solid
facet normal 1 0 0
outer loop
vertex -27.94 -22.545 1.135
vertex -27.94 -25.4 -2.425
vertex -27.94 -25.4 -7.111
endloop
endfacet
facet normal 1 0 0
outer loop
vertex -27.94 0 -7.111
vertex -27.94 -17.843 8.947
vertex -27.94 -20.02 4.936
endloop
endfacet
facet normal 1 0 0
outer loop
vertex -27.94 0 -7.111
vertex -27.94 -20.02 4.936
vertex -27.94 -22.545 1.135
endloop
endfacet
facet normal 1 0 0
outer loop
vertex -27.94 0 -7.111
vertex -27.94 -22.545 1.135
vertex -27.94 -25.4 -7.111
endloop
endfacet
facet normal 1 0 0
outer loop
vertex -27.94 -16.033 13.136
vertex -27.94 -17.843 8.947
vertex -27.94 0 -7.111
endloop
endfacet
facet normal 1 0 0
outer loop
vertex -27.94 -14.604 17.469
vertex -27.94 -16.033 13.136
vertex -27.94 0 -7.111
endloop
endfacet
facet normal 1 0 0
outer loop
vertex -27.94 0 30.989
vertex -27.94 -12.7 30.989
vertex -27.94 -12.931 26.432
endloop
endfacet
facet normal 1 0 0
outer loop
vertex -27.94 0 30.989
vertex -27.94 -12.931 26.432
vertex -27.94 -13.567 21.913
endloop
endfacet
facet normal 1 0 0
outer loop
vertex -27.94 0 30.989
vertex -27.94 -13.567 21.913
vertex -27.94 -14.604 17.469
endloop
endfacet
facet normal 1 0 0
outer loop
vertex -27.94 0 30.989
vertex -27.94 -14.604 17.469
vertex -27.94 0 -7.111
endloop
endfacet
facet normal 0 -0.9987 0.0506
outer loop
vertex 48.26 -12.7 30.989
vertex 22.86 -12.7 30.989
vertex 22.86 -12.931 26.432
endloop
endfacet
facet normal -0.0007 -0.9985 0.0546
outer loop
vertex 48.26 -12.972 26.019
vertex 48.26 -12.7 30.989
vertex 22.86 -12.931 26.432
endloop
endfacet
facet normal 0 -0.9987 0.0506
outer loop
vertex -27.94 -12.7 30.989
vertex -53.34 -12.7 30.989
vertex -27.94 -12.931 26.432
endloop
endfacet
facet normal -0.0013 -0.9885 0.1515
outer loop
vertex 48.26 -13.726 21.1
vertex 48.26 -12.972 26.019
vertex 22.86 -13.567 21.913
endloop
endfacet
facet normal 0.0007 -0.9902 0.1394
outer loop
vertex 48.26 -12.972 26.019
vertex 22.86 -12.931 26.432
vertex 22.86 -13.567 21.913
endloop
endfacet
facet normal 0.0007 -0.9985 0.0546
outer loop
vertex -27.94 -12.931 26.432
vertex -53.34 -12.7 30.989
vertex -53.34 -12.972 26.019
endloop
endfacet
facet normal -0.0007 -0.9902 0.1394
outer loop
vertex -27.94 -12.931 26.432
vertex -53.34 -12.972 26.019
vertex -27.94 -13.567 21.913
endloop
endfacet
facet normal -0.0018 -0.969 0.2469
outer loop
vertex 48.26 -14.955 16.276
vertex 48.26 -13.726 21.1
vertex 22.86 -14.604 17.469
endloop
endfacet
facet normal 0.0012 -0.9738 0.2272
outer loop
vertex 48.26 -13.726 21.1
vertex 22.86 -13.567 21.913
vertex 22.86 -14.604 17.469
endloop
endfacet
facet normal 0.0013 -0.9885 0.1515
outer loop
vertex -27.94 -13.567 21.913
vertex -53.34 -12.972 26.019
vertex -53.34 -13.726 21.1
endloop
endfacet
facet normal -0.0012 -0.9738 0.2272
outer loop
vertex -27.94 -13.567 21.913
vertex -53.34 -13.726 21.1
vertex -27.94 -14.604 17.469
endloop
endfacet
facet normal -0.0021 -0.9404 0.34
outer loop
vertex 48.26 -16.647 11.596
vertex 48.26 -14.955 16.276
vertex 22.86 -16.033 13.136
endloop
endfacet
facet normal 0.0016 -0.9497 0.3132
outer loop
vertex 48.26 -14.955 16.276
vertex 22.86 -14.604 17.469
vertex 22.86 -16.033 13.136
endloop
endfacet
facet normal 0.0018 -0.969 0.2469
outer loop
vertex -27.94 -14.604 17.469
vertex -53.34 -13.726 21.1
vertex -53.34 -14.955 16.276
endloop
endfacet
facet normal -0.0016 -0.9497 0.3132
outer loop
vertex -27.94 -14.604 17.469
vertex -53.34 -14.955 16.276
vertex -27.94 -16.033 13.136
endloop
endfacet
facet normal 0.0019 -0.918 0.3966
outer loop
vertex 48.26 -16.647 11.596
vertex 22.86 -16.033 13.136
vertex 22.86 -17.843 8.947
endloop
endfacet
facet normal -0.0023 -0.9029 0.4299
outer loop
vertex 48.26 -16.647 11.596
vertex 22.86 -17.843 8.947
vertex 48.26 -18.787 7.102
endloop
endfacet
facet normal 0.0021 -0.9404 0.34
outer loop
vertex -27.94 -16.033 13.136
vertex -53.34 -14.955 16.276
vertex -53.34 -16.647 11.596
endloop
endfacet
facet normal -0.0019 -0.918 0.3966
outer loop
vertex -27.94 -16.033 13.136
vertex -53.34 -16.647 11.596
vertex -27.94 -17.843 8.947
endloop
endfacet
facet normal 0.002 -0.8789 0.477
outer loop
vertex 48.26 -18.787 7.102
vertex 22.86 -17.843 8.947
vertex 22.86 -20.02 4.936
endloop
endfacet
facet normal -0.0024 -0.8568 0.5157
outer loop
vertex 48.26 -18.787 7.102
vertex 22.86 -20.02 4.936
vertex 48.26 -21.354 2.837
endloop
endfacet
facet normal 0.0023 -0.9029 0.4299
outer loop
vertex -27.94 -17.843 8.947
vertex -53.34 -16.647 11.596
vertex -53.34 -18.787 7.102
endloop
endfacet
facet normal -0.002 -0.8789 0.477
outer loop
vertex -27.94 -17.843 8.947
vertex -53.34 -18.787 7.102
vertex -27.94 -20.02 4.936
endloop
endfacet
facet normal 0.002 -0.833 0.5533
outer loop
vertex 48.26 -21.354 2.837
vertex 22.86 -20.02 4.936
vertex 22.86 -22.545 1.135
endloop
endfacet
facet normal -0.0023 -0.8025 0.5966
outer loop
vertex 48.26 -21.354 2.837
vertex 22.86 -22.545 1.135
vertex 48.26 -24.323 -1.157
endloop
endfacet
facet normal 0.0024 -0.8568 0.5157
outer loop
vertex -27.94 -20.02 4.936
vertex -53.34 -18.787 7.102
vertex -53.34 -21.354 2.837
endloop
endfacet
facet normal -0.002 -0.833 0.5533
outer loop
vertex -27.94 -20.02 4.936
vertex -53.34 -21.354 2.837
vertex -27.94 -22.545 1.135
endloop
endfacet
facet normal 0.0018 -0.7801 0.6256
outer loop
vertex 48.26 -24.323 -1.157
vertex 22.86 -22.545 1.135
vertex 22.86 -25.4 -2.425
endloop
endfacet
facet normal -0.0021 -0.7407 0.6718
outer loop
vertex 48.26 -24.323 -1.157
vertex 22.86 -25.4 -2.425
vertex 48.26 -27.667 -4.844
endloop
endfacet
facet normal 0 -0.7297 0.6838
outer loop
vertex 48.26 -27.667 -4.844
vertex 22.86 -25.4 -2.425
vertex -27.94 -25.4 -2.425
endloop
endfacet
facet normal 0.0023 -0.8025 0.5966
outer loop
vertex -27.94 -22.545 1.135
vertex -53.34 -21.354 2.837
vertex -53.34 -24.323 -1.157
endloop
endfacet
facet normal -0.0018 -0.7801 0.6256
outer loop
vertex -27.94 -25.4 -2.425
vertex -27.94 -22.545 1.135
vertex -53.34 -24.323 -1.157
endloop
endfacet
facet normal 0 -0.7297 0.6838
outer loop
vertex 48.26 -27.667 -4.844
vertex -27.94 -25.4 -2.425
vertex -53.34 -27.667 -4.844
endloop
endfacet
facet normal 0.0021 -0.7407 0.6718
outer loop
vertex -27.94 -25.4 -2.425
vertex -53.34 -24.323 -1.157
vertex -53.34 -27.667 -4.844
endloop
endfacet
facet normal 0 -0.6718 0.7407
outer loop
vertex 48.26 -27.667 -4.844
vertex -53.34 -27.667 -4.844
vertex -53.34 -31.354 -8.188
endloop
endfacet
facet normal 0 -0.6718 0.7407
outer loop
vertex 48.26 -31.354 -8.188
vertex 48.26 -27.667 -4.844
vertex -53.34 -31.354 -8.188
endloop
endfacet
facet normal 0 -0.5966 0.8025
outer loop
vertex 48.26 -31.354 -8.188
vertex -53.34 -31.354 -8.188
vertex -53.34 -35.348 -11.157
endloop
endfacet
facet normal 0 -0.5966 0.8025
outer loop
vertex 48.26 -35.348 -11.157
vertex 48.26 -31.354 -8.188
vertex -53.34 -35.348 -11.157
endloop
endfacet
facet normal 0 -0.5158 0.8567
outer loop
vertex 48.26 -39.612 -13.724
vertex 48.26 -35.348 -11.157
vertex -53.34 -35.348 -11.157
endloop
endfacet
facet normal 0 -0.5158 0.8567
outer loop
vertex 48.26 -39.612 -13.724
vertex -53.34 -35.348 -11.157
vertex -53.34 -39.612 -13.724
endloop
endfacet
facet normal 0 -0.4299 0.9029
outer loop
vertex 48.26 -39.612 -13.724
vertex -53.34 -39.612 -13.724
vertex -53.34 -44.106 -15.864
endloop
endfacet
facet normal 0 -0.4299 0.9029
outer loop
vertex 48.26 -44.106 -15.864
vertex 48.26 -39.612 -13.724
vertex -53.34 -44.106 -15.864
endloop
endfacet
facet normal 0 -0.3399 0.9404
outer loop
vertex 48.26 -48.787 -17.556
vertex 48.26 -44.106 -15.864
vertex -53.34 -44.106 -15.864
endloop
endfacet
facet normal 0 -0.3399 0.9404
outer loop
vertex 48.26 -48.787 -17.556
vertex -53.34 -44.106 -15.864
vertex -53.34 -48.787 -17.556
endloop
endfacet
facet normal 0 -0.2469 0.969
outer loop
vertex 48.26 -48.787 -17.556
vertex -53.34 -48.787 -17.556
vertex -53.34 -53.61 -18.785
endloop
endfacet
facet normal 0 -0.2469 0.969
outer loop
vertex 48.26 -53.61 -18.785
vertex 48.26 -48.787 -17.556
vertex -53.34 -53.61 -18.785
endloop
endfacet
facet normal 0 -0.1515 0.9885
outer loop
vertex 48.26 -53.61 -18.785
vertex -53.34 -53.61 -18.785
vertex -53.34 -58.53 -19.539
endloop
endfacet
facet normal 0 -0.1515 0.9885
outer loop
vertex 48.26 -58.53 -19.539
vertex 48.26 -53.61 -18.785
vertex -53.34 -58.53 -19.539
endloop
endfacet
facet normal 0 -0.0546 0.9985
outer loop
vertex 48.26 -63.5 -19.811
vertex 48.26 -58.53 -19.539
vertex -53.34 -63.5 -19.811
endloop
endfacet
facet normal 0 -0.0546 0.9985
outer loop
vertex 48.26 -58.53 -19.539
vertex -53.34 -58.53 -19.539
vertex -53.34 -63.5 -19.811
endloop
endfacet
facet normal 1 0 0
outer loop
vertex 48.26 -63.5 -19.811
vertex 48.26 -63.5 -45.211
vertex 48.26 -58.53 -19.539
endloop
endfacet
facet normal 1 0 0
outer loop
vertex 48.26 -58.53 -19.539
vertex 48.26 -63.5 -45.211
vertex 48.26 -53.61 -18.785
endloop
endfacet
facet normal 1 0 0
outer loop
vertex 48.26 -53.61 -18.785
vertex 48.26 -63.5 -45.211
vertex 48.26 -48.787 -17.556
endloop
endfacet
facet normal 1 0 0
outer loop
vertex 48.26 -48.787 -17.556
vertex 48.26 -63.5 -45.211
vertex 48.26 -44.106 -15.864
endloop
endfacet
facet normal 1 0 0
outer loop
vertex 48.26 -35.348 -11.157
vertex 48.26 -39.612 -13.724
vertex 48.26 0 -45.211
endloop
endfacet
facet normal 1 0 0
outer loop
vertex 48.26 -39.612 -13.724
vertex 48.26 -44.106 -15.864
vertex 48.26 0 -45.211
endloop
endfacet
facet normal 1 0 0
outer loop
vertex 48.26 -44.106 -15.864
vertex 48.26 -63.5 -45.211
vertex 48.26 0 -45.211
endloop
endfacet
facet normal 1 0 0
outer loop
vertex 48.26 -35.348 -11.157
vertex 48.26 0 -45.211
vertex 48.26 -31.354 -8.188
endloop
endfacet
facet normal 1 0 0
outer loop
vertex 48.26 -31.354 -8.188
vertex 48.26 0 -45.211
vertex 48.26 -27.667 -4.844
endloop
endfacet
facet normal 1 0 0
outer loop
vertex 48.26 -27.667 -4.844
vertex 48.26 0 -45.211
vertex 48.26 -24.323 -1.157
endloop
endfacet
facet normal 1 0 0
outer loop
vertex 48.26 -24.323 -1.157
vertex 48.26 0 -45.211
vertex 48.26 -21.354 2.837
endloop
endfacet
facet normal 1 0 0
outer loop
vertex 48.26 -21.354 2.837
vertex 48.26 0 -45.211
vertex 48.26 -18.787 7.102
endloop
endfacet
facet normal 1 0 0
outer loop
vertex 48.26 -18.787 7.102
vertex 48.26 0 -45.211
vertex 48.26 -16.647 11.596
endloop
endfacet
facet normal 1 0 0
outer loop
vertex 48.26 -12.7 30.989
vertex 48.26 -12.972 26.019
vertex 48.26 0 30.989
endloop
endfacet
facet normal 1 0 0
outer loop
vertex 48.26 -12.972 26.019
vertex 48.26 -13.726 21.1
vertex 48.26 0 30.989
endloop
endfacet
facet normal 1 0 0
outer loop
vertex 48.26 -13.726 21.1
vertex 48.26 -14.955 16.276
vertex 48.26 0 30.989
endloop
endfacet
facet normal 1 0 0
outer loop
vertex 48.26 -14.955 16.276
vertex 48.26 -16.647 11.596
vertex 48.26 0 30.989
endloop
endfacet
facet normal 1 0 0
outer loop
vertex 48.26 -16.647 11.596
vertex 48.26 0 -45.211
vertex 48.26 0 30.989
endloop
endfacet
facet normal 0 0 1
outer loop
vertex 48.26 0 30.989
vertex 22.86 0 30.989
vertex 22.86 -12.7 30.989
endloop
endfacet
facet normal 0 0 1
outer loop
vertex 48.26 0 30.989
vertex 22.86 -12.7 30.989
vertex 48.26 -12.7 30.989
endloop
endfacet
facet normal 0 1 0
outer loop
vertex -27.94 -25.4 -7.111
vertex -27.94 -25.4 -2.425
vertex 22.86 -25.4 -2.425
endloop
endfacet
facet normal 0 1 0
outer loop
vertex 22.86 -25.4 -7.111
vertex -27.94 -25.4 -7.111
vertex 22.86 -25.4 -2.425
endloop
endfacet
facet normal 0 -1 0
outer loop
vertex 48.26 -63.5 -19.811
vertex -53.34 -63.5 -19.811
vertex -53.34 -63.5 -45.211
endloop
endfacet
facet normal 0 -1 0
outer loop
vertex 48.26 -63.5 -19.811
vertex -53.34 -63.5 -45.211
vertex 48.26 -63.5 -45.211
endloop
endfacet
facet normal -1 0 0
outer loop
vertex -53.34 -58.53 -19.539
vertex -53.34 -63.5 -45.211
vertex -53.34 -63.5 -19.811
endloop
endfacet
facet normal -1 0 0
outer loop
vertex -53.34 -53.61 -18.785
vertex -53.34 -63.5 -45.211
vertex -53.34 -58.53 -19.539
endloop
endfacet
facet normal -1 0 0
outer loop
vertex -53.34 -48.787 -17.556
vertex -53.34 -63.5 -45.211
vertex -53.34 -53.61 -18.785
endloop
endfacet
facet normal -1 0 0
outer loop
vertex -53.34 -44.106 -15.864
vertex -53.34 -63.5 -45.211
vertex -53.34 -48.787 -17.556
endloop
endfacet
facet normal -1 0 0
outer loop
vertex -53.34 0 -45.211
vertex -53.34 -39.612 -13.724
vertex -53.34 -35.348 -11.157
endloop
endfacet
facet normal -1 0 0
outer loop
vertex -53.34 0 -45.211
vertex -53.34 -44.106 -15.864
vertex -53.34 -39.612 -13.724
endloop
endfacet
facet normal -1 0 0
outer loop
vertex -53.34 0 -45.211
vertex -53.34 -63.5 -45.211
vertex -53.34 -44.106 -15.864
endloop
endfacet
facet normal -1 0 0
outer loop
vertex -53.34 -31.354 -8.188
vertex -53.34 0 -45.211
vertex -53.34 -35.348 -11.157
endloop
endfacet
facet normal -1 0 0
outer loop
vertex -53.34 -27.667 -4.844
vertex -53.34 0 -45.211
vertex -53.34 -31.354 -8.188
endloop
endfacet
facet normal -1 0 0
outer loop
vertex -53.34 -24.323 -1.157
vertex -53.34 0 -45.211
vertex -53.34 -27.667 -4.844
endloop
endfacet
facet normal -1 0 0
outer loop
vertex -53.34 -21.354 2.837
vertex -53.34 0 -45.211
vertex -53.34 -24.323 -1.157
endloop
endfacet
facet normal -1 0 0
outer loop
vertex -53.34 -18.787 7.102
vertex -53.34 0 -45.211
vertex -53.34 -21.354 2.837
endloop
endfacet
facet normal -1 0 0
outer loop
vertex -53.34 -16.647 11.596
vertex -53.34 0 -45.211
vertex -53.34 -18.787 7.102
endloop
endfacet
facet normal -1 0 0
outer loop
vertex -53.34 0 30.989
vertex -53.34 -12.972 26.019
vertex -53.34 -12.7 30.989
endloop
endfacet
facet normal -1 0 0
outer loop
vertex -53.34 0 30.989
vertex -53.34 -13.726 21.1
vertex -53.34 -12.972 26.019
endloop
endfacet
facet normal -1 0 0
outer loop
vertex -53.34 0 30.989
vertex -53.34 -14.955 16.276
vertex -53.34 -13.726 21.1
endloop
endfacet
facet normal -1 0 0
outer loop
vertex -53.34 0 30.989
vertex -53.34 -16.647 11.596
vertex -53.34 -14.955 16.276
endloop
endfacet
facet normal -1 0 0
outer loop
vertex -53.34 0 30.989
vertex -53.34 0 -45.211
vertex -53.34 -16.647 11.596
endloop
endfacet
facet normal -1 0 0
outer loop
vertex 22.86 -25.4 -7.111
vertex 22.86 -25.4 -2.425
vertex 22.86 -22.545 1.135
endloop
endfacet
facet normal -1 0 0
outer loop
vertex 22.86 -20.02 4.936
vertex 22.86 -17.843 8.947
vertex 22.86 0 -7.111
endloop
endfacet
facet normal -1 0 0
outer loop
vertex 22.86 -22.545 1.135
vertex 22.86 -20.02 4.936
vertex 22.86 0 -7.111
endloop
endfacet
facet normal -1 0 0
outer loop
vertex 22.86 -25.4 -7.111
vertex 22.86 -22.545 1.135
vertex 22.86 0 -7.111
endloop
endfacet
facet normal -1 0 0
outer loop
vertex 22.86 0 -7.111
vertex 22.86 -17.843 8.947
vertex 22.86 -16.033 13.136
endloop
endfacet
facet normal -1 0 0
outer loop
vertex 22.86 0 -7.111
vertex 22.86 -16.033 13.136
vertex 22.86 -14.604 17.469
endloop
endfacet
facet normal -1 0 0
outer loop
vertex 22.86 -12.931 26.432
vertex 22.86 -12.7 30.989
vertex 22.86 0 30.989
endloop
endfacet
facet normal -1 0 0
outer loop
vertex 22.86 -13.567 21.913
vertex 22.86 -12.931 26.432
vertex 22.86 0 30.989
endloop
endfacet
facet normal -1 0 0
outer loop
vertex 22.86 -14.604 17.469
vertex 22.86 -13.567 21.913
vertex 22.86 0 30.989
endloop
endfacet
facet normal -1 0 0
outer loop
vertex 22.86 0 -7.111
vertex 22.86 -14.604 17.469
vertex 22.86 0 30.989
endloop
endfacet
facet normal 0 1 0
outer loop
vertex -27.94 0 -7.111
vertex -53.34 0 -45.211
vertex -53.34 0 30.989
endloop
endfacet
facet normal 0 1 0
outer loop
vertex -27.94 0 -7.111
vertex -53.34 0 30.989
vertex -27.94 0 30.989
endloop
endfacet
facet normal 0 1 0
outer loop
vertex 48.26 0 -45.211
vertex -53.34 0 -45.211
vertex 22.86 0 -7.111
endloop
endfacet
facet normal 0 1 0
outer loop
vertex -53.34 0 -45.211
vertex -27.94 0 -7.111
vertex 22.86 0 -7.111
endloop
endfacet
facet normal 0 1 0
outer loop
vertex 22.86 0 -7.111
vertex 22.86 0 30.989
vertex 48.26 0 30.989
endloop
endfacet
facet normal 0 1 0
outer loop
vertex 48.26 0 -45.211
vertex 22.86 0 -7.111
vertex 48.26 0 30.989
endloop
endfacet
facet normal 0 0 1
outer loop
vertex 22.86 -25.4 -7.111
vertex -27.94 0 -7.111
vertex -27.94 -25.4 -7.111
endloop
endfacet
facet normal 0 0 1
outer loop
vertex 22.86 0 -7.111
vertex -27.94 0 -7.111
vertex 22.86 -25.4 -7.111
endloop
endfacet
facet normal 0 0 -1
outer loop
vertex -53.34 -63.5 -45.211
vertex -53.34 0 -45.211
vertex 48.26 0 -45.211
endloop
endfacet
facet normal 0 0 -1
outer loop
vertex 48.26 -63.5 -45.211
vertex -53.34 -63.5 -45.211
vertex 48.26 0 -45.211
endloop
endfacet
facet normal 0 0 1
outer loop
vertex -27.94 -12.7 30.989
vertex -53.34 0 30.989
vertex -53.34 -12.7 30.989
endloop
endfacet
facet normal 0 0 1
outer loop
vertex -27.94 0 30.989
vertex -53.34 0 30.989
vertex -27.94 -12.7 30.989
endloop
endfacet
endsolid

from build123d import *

# Parameters (mm, degrees)
F0_W     = 101.6
F0_H     = 76.2
F1_DEPTH = 63.5
F3_DEPTH = 101.6
F4_W     = 50.8
F4_H     = 25.4
F5_DEPTH = 38.1


with BuildPart() as f1:
    # F0 (on Front) → F1 (new body)
    with BuildSketch(Plane.XZ):
        with Locations((-2.540003, -7.110645)):
            Rectangle(F0_W, F0_H)
    extrude(amount=F1_DEPTH)

    # F2 (on face) → F3 (cut)
    with BuildSketch(Plane(origin=(-53.340003, 0, 0), x_dir=(0, -1, 0), z_dir=(-1, 0, 0))):
        with BuildLine():
            Line((63.5, 30.989355), (12.7, 30.989355))
            ThreePointArc((12.7, 30.989355), (27.666821, -4.843824), (63.5, -19.810645))
            Line((63.5, -19.810645), (63.5, 30.989355))
        make_face()
    extrude(amount=-F3_DEPTH, mode=Mode.SUBTRACT)

    # F4 (on face) → F5 (cut)
    with BuildSketch(Plane.XY.offset(30.989355)):
        with Locations((-2.540003, -12.7)):
            Rectangle(F4_W, F4_H)
    extrude(amount=-F5_DEPTH, mode=Mode.SUBTRACT)


solid = f1.part
